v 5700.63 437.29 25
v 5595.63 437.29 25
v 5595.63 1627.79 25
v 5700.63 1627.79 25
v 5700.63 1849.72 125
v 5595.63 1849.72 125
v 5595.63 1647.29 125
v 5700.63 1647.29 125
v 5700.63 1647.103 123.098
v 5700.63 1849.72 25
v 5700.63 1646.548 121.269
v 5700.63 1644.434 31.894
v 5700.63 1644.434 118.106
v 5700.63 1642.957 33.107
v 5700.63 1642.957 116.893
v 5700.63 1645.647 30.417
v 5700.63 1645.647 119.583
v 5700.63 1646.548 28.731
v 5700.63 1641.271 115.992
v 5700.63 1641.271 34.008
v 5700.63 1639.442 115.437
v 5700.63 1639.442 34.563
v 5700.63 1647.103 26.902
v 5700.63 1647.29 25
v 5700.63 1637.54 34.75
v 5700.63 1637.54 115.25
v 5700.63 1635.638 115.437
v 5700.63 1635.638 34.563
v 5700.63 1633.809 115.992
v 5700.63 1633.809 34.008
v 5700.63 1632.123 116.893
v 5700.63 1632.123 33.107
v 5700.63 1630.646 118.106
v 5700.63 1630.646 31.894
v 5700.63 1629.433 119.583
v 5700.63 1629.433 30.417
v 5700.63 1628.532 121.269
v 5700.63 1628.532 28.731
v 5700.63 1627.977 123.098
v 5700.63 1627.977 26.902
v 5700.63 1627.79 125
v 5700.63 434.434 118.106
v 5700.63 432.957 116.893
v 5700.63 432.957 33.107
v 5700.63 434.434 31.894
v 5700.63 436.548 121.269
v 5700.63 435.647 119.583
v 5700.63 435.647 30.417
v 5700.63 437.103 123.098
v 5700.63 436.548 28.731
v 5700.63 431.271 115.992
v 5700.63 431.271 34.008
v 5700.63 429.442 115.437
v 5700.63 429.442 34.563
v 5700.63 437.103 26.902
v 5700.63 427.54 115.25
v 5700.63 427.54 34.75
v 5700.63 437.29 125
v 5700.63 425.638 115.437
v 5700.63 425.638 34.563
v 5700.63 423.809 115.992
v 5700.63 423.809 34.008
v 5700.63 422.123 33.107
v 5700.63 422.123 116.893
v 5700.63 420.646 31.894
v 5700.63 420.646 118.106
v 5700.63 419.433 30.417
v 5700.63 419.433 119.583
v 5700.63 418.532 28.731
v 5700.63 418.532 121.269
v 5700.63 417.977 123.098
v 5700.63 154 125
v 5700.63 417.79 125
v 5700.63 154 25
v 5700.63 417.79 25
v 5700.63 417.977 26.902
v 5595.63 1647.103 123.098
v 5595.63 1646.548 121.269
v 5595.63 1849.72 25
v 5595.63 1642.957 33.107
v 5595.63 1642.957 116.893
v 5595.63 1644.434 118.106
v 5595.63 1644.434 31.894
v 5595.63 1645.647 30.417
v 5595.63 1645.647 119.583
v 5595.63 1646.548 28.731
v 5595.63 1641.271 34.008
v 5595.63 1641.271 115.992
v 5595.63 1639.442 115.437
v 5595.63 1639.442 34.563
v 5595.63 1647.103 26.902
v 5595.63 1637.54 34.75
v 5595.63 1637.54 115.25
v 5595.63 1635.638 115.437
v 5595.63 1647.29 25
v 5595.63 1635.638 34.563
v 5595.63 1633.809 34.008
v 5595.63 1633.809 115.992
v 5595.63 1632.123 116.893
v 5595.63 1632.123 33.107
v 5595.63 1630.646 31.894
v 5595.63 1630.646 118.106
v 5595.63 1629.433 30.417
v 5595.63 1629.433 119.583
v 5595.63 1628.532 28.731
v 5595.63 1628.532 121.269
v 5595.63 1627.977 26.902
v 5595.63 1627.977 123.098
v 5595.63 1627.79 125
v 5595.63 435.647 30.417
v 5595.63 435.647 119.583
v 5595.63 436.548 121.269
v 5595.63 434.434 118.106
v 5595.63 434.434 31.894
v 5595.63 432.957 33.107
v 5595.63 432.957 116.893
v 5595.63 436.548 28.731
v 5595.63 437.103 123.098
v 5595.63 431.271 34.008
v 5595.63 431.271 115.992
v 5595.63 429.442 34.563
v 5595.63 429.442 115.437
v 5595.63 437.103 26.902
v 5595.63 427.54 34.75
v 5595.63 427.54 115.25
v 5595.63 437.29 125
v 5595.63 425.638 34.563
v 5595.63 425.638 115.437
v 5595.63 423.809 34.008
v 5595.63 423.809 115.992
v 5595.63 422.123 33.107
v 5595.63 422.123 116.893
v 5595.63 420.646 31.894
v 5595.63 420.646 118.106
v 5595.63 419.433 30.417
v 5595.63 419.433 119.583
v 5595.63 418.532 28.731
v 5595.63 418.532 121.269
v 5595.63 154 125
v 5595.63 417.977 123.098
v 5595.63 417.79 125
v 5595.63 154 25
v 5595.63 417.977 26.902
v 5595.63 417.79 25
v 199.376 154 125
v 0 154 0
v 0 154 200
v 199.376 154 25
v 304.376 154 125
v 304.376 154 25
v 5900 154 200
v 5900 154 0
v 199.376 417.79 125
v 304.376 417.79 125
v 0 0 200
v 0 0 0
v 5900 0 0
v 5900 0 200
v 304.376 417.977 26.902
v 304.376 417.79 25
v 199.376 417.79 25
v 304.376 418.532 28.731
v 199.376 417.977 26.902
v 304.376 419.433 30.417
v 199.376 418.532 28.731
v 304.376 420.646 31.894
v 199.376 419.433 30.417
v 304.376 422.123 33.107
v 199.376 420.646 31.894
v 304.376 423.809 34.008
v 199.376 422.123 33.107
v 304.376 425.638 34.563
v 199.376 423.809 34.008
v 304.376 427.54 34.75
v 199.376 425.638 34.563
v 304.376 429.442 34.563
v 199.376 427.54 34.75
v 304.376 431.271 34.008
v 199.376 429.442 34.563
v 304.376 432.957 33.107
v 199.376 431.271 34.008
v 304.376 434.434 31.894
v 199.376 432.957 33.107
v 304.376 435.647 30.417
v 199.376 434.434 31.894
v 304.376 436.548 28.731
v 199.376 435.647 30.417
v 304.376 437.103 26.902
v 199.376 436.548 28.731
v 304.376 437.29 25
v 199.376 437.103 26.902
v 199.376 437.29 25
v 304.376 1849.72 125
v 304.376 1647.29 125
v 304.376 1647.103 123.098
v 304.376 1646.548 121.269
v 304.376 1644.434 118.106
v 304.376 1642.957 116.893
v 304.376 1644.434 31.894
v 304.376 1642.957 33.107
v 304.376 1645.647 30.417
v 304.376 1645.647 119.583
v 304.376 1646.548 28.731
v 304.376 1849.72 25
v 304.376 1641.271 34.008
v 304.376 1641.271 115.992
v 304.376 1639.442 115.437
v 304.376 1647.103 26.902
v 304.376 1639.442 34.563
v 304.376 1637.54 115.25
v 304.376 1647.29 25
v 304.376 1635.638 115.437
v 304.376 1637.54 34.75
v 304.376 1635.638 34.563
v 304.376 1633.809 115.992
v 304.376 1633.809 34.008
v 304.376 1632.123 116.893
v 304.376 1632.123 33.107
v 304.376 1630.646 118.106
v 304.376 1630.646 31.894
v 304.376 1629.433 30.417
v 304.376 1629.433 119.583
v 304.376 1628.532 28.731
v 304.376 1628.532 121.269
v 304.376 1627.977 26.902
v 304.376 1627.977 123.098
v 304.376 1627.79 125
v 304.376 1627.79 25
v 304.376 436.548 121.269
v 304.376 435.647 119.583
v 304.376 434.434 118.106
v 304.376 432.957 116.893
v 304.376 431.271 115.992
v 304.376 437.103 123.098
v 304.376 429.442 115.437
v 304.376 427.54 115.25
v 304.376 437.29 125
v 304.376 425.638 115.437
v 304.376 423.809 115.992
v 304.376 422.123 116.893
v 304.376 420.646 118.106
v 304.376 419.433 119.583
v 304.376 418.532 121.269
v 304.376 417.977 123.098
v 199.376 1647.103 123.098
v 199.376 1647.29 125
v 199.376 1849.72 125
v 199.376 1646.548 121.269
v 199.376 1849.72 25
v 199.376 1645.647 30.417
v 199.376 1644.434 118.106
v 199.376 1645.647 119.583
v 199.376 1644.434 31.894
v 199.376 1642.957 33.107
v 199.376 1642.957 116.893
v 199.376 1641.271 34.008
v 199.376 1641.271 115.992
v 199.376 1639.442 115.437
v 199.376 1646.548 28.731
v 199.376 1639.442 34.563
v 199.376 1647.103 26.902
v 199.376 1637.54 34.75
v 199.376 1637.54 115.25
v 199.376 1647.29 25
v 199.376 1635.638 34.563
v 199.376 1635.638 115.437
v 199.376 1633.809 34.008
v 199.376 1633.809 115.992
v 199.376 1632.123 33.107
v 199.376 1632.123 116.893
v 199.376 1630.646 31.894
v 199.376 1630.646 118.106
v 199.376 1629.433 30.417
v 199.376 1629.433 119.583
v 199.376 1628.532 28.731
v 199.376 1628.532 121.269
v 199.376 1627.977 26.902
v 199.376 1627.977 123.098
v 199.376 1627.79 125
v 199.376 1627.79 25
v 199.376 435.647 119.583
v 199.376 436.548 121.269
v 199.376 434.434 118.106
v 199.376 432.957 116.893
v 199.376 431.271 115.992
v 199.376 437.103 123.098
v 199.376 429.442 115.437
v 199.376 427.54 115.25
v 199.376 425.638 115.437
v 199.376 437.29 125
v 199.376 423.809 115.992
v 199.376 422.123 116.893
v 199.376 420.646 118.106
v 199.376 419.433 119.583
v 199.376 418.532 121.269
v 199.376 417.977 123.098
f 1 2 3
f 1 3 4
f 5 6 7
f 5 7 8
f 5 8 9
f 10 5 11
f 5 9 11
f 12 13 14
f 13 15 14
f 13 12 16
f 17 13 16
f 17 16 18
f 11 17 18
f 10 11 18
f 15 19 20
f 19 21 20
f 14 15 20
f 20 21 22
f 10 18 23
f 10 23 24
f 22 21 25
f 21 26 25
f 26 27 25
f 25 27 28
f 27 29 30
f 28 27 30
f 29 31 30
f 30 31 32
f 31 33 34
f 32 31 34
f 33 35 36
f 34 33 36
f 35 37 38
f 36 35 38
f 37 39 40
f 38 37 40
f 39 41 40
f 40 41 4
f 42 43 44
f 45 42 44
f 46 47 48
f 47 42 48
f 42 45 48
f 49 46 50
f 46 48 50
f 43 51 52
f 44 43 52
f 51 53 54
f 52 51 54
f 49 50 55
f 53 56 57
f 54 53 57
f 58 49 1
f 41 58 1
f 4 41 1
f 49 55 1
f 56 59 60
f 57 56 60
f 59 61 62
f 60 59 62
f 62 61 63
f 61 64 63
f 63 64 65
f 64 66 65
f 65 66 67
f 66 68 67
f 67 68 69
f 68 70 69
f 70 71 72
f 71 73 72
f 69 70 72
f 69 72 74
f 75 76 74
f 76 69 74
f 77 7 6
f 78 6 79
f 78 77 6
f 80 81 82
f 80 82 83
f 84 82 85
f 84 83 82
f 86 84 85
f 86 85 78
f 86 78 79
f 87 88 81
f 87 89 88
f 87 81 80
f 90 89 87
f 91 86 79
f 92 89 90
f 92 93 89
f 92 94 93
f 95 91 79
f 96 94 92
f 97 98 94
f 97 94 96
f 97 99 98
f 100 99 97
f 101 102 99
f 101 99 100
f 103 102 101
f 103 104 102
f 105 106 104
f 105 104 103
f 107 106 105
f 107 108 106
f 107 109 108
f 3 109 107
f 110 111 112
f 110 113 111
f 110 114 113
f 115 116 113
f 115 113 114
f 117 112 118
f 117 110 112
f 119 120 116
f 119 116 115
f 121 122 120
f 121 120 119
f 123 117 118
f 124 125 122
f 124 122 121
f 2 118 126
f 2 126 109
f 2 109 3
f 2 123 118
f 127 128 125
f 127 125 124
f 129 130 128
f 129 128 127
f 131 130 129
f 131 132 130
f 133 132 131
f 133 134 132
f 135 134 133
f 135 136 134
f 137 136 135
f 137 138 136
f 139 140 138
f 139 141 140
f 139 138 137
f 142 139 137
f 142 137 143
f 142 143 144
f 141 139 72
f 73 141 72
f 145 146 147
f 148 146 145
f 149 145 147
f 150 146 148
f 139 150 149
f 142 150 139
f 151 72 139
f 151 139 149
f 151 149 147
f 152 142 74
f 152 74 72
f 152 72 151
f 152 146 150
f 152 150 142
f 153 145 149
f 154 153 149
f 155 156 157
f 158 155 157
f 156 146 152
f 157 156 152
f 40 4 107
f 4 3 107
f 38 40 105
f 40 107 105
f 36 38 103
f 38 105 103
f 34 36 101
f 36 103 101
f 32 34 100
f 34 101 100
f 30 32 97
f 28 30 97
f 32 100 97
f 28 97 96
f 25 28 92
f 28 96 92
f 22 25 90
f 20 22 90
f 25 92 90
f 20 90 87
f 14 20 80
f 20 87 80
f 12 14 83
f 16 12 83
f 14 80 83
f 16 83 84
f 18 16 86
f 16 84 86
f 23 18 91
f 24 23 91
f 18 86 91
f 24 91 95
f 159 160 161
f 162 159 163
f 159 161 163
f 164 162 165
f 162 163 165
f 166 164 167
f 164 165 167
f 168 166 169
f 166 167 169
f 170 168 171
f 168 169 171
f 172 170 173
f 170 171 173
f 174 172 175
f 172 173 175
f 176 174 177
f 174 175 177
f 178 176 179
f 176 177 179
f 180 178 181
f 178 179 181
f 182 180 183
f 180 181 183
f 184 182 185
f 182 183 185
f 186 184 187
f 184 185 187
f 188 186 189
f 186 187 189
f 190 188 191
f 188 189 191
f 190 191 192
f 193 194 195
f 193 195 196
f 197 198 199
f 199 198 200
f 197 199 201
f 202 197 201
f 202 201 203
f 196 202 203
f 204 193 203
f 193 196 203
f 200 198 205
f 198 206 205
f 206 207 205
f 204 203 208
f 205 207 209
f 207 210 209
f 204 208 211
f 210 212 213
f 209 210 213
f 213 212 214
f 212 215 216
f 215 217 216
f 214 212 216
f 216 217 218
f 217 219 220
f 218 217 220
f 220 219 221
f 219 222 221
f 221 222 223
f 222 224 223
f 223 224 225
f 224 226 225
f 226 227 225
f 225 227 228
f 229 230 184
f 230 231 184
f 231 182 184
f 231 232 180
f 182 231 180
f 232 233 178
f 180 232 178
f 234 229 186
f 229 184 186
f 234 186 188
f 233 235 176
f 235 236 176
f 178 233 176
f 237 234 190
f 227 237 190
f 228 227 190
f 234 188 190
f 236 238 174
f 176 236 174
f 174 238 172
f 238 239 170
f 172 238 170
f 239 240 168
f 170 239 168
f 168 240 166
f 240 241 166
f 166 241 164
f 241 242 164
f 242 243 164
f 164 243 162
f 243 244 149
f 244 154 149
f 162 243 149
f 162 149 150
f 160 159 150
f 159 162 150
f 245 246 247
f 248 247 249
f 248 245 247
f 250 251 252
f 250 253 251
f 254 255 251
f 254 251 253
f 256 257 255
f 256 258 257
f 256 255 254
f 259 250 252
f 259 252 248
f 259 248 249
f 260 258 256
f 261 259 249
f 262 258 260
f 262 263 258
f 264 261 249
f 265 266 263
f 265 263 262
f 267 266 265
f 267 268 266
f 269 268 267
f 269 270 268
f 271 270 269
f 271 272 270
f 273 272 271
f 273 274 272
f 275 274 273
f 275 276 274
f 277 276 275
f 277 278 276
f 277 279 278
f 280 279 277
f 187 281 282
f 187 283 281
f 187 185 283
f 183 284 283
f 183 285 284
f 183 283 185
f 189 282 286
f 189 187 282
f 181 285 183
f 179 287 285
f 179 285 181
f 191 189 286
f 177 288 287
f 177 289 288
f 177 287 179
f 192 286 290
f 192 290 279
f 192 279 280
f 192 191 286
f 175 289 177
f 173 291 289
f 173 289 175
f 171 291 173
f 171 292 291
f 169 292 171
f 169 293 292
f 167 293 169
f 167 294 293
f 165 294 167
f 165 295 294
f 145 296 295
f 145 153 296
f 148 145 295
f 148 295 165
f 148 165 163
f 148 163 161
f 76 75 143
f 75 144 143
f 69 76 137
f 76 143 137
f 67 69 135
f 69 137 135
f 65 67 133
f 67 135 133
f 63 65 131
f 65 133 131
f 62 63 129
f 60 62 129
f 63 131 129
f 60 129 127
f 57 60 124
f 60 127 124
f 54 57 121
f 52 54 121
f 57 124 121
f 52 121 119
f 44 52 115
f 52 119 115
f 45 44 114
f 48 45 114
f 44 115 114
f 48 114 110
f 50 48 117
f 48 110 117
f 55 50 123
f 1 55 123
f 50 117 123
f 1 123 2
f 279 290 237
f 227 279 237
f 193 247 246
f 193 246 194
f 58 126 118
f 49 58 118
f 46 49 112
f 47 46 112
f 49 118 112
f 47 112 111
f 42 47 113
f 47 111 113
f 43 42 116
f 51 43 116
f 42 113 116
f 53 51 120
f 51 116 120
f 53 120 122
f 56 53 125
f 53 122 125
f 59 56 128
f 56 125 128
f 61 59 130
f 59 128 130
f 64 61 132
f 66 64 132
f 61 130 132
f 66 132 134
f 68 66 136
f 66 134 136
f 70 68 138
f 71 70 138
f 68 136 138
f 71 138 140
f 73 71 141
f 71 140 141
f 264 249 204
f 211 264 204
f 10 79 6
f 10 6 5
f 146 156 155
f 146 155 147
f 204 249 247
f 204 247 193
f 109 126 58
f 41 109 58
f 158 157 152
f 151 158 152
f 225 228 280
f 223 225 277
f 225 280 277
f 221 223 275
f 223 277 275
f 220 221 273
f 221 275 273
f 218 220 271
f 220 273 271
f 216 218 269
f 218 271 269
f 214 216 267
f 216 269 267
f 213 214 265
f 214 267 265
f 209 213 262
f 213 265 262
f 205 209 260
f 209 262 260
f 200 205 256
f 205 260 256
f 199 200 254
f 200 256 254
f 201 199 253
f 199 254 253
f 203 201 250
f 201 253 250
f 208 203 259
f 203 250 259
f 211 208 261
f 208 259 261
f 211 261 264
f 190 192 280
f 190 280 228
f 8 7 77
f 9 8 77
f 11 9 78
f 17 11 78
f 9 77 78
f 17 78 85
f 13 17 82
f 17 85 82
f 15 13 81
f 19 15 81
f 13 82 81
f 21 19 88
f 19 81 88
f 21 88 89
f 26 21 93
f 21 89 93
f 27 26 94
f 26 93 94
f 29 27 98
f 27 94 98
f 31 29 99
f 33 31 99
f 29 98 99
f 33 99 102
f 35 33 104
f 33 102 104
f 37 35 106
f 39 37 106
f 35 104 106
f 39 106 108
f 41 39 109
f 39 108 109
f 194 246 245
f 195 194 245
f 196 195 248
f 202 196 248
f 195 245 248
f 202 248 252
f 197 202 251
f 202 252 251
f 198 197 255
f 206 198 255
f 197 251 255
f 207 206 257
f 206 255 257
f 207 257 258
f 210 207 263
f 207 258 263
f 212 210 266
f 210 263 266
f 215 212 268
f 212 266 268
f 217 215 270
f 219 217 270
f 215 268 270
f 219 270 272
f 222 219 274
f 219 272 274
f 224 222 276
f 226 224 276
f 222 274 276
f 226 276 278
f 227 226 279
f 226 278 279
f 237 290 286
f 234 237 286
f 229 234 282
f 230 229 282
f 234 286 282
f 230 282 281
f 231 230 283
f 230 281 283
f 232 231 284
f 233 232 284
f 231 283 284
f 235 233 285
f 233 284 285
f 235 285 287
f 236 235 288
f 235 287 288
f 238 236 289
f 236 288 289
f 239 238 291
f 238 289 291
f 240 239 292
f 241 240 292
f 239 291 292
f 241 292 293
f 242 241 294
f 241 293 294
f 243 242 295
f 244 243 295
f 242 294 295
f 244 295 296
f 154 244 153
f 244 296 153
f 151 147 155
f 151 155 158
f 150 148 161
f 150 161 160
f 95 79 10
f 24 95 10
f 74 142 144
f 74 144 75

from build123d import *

# Parameters (mm, degrees)
ESBO_O1_W                                = 5900
ESBO_O1_H                                = 154
RESSALTO_EXTRUS_O1_DEPTH                 = 200
ESBO_O3_W                                = 105
ESBO_O3_H                                = 100
RESSALTO_EXTRUS_O2_DEPTH                 = 1849.72
BROCA_DE_ROSQUEAR_PARA_TARRAXA_DE_M222_D = 19.5
BROCA_DE_ROSQUEAR_PARA_TARRAXA_DE_M223_D = 19.5


with BuildPart() as part:
    # Esboço1 → Ressalto-extrusão1 (new body)
    with BuildSketch(Plane.XY):
        with Locations((2950, 77)):
            Rectangle(ESBO_O1_W, ESBO_O1_H)
    extrude(amount=RESSALTO_EXTRUS_O1_DEPTH)

    # Esboço3 → Ressalto-extrusão2 (add)
    with BuildSketch(Plane(origin=(0, 0, 0), x_dir=(1, 0, 0), z_dir=(0, 1, 0))):
        with Locations((5648.13, -75)):
            Rectangle(ESBO_O3_W, ESBO_O3_H)
        with Locations((251.876102892, -75)):
            Rectangle(ESBO_O3_W, ESBO_O3_H)
    extrude(amount=RESSALTO_EXTRUS_O2_DEPTH)

    # Broca de rosquear para tarraxa de M222 (through all)
    with Locations(Plane(origin=(5700.63, 0, 0), x_dir=(0, 0, -1), z_dir=(1, 0, 0))):
        with Locations((-125, 427.54), (-25, 427.54)):
            Hole(BROCA_DE_ROSQUEAR_PARA_TARRAXA_DE_M222_D / 2)

    # Broca de rosquear para tarraxa de M223 (through all)
    with Locations(Plane(origin=(5700.63, 0, 0), x_dir=(0, 0, -1), z_dir=(1, 0, 0))):
        with Locations((-125, 1637.54), (-25, 1637.54)):
            Hole(BROCA_DE_ROSQUEAR_PARA_TARRAXA_DE_M223_D / 2)


solid = part.part
